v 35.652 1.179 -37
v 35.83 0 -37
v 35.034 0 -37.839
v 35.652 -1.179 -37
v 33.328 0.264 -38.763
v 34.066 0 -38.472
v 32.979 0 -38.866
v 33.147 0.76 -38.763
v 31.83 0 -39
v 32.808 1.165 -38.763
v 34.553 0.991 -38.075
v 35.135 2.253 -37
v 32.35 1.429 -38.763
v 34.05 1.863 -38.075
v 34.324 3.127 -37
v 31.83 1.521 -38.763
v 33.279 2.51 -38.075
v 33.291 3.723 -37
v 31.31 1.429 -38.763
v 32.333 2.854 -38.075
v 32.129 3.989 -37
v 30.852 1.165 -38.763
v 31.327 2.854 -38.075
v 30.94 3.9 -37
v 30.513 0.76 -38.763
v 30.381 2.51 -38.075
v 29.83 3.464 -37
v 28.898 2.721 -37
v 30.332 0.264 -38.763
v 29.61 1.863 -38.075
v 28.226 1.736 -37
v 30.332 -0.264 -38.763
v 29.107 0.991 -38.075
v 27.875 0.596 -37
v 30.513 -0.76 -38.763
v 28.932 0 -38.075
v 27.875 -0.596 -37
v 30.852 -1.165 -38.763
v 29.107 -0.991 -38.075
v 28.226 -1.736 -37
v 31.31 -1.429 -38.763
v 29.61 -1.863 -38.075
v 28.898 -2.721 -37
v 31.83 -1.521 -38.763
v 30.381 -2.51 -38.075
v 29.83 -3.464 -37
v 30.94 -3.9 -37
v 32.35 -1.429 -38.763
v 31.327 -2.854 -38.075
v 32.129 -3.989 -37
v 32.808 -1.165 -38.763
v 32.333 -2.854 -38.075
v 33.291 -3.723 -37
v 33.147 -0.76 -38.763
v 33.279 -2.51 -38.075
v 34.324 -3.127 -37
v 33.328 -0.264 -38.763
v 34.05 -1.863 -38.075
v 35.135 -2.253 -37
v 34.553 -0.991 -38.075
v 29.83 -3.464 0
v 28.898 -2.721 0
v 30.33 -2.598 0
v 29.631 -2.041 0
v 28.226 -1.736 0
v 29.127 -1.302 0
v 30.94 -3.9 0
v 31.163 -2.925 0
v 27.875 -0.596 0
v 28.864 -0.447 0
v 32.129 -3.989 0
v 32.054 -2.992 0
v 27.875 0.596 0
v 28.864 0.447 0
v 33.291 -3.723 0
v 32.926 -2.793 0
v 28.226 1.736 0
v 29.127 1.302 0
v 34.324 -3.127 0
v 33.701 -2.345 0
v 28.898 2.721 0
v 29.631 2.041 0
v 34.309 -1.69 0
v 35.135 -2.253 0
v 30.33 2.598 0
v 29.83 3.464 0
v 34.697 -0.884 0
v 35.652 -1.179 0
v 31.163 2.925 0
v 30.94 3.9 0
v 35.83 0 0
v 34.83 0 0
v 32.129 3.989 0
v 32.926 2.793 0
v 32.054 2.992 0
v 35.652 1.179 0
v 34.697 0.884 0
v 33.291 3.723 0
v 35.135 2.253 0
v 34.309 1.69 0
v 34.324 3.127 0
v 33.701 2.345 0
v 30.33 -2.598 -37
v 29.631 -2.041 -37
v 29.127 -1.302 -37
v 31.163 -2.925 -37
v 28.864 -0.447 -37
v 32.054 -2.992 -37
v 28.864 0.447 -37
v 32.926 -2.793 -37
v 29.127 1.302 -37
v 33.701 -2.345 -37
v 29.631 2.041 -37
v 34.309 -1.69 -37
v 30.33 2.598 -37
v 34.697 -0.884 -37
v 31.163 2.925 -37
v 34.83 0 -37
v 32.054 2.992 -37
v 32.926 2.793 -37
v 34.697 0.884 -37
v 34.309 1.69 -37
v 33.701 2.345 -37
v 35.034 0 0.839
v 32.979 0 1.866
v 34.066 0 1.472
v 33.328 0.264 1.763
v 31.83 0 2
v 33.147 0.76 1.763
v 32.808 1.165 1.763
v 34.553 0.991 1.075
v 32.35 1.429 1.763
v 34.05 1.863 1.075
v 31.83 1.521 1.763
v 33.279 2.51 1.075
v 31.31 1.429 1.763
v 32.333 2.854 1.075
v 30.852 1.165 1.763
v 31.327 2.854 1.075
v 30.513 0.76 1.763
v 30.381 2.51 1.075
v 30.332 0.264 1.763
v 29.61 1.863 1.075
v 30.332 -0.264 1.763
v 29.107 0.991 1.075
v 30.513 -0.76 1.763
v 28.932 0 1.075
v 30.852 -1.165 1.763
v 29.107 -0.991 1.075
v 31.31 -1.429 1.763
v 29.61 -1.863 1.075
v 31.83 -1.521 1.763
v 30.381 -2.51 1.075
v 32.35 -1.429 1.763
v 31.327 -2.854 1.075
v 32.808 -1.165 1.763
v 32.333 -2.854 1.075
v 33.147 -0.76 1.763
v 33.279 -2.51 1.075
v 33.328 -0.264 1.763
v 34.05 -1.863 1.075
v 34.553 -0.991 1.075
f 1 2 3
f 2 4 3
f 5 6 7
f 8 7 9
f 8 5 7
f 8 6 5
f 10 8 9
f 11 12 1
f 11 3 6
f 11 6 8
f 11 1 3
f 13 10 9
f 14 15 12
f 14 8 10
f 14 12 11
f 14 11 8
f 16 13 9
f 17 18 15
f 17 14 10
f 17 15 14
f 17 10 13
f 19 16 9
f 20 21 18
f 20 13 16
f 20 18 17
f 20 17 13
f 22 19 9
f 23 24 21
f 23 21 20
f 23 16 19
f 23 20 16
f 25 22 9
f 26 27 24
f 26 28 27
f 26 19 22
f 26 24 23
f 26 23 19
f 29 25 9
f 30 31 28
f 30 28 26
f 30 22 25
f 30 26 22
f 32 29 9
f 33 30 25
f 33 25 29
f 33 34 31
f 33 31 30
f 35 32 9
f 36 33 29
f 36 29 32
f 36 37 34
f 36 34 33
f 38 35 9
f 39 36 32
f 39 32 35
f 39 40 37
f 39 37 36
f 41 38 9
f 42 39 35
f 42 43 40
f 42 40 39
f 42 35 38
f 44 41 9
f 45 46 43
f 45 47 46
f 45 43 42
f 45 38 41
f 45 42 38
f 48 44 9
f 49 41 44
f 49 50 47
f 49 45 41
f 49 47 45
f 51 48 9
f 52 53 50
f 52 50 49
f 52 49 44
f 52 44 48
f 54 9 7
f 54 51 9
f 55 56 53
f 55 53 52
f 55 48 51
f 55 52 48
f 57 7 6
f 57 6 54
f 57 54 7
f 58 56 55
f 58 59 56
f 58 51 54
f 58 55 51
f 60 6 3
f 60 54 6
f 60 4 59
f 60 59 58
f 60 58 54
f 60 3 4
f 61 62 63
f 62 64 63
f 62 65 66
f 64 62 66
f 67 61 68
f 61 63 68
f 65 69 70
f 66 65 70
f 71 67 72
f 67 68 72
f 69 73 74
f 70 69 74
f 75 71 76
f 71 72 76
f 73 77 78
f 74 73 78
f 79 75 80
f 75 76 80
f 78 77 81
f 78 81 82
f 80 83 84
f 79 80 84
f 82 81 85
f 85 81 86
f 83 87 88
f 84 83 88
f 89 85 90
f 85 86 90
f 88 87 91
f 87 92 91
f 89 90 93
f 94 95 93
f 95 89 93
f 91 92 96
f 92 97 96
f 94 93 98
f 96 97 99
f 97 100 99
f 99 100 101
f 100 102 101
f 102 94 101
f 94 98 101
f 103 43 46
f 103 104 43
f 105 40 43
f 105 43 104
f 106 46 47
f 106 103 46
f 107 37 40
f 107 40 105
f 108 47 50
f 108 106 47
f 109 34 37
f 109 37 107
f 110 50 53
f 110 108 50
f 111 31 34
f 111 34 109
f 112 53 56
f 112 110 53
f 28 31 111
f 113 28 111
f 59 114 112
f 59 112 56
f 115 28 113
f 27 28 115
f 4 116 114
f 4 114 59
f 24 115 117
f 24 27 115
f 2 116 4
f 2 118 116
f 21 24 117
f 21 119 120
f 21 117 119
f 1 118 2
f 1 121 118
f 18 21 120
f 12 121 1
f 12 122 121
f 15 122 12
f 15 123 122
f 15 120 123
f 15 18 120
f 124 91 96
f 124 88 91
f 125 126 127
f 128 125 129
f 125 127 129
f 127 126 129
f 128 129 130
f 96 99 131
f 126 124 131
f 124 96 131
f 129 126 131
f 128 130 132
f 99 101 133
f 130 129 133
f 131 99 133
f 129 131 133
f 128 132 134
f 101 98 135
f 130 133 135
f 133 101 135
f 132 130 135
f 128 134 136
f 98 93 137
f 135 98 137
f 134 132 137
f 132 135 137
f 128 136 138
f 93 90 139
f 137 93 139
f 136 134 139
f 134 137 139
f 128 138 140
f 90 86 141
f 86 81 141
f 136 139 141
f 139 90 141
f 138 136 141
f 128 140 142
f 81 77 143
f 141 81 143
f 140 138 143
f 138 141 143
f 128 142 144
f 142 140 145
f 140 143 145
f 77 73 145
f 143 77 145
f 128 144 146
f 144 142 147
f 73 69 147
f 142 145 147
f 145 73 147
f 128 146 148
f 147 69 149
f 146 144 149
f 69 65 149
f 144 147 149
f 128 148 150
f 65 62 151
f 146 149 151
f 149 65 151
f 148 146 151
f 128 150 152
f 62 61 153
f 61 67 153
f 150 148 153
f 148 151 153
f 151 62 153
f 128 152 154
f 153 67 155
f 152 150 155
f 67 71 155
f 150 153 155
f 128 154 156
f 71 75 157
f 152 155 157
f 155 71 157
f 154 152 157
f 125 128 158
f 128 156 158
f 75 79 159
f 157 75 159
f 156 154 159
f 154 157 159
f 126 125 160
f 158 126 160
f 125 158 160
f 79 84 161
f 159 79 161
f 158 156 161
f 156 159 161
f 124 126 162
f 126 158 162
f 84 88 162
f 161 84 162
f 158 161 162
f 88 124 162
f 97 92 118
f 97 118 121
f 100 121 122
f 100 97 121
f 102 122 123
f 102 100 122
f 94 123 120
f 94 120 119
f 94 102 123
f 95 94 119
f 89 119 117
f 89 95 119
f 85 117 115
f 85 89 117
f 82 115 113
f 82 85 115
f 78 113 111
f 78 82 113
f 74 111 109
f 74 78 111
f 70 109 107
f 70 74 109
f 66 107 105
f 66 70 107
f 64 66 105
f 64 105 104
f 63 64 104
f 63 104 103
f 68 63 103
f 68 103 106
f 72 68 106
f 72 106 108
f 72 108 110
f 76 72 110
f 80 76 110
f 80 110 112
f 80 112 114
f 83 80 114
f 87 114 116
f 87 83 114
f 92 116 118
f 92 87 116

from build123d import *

# Parameters (mm, degrees)
CROQUIS1_R              = 3
SALIENTE_EXTRUIR1_DEPTH = 37


with BuildPart() as part:
    # Croquis1 → Saliente-Extruir1 (new body)
    with BuildSketch(Plane.XY):
        with Locations((31.830127019, 0)):
            Circle(CROQUIS1_R)
    extrude(amount=-SALIENTE_EXTRUIR1_DEPTH)

    # Croquis2 → Revolución1 (revolve)
    with BuildSketch(Plane(origin=(0, 0, 0), x_dir=(1, 0, 0), z_dir=(0, 1, 0))):
        with BuildLine():
            Line((31.830127019, 0), (31.830127019, -2))
            ThreePointArc((31.830127019, -2), (34.066194996, -1.472135955), (35.830127019, 0))
            Line((35.830127019, 0), (31.830127019, 0))
        make_face()
    revoluci_n1 = revolve(axis=Axis((31.830127019, 0, 0), (0, 0, 1)))

    # Simetría1: Revolución1 across plane
    add(revoluci_n1.mirror(Plane.XY.offset(-18.5)))


solid = part.part
